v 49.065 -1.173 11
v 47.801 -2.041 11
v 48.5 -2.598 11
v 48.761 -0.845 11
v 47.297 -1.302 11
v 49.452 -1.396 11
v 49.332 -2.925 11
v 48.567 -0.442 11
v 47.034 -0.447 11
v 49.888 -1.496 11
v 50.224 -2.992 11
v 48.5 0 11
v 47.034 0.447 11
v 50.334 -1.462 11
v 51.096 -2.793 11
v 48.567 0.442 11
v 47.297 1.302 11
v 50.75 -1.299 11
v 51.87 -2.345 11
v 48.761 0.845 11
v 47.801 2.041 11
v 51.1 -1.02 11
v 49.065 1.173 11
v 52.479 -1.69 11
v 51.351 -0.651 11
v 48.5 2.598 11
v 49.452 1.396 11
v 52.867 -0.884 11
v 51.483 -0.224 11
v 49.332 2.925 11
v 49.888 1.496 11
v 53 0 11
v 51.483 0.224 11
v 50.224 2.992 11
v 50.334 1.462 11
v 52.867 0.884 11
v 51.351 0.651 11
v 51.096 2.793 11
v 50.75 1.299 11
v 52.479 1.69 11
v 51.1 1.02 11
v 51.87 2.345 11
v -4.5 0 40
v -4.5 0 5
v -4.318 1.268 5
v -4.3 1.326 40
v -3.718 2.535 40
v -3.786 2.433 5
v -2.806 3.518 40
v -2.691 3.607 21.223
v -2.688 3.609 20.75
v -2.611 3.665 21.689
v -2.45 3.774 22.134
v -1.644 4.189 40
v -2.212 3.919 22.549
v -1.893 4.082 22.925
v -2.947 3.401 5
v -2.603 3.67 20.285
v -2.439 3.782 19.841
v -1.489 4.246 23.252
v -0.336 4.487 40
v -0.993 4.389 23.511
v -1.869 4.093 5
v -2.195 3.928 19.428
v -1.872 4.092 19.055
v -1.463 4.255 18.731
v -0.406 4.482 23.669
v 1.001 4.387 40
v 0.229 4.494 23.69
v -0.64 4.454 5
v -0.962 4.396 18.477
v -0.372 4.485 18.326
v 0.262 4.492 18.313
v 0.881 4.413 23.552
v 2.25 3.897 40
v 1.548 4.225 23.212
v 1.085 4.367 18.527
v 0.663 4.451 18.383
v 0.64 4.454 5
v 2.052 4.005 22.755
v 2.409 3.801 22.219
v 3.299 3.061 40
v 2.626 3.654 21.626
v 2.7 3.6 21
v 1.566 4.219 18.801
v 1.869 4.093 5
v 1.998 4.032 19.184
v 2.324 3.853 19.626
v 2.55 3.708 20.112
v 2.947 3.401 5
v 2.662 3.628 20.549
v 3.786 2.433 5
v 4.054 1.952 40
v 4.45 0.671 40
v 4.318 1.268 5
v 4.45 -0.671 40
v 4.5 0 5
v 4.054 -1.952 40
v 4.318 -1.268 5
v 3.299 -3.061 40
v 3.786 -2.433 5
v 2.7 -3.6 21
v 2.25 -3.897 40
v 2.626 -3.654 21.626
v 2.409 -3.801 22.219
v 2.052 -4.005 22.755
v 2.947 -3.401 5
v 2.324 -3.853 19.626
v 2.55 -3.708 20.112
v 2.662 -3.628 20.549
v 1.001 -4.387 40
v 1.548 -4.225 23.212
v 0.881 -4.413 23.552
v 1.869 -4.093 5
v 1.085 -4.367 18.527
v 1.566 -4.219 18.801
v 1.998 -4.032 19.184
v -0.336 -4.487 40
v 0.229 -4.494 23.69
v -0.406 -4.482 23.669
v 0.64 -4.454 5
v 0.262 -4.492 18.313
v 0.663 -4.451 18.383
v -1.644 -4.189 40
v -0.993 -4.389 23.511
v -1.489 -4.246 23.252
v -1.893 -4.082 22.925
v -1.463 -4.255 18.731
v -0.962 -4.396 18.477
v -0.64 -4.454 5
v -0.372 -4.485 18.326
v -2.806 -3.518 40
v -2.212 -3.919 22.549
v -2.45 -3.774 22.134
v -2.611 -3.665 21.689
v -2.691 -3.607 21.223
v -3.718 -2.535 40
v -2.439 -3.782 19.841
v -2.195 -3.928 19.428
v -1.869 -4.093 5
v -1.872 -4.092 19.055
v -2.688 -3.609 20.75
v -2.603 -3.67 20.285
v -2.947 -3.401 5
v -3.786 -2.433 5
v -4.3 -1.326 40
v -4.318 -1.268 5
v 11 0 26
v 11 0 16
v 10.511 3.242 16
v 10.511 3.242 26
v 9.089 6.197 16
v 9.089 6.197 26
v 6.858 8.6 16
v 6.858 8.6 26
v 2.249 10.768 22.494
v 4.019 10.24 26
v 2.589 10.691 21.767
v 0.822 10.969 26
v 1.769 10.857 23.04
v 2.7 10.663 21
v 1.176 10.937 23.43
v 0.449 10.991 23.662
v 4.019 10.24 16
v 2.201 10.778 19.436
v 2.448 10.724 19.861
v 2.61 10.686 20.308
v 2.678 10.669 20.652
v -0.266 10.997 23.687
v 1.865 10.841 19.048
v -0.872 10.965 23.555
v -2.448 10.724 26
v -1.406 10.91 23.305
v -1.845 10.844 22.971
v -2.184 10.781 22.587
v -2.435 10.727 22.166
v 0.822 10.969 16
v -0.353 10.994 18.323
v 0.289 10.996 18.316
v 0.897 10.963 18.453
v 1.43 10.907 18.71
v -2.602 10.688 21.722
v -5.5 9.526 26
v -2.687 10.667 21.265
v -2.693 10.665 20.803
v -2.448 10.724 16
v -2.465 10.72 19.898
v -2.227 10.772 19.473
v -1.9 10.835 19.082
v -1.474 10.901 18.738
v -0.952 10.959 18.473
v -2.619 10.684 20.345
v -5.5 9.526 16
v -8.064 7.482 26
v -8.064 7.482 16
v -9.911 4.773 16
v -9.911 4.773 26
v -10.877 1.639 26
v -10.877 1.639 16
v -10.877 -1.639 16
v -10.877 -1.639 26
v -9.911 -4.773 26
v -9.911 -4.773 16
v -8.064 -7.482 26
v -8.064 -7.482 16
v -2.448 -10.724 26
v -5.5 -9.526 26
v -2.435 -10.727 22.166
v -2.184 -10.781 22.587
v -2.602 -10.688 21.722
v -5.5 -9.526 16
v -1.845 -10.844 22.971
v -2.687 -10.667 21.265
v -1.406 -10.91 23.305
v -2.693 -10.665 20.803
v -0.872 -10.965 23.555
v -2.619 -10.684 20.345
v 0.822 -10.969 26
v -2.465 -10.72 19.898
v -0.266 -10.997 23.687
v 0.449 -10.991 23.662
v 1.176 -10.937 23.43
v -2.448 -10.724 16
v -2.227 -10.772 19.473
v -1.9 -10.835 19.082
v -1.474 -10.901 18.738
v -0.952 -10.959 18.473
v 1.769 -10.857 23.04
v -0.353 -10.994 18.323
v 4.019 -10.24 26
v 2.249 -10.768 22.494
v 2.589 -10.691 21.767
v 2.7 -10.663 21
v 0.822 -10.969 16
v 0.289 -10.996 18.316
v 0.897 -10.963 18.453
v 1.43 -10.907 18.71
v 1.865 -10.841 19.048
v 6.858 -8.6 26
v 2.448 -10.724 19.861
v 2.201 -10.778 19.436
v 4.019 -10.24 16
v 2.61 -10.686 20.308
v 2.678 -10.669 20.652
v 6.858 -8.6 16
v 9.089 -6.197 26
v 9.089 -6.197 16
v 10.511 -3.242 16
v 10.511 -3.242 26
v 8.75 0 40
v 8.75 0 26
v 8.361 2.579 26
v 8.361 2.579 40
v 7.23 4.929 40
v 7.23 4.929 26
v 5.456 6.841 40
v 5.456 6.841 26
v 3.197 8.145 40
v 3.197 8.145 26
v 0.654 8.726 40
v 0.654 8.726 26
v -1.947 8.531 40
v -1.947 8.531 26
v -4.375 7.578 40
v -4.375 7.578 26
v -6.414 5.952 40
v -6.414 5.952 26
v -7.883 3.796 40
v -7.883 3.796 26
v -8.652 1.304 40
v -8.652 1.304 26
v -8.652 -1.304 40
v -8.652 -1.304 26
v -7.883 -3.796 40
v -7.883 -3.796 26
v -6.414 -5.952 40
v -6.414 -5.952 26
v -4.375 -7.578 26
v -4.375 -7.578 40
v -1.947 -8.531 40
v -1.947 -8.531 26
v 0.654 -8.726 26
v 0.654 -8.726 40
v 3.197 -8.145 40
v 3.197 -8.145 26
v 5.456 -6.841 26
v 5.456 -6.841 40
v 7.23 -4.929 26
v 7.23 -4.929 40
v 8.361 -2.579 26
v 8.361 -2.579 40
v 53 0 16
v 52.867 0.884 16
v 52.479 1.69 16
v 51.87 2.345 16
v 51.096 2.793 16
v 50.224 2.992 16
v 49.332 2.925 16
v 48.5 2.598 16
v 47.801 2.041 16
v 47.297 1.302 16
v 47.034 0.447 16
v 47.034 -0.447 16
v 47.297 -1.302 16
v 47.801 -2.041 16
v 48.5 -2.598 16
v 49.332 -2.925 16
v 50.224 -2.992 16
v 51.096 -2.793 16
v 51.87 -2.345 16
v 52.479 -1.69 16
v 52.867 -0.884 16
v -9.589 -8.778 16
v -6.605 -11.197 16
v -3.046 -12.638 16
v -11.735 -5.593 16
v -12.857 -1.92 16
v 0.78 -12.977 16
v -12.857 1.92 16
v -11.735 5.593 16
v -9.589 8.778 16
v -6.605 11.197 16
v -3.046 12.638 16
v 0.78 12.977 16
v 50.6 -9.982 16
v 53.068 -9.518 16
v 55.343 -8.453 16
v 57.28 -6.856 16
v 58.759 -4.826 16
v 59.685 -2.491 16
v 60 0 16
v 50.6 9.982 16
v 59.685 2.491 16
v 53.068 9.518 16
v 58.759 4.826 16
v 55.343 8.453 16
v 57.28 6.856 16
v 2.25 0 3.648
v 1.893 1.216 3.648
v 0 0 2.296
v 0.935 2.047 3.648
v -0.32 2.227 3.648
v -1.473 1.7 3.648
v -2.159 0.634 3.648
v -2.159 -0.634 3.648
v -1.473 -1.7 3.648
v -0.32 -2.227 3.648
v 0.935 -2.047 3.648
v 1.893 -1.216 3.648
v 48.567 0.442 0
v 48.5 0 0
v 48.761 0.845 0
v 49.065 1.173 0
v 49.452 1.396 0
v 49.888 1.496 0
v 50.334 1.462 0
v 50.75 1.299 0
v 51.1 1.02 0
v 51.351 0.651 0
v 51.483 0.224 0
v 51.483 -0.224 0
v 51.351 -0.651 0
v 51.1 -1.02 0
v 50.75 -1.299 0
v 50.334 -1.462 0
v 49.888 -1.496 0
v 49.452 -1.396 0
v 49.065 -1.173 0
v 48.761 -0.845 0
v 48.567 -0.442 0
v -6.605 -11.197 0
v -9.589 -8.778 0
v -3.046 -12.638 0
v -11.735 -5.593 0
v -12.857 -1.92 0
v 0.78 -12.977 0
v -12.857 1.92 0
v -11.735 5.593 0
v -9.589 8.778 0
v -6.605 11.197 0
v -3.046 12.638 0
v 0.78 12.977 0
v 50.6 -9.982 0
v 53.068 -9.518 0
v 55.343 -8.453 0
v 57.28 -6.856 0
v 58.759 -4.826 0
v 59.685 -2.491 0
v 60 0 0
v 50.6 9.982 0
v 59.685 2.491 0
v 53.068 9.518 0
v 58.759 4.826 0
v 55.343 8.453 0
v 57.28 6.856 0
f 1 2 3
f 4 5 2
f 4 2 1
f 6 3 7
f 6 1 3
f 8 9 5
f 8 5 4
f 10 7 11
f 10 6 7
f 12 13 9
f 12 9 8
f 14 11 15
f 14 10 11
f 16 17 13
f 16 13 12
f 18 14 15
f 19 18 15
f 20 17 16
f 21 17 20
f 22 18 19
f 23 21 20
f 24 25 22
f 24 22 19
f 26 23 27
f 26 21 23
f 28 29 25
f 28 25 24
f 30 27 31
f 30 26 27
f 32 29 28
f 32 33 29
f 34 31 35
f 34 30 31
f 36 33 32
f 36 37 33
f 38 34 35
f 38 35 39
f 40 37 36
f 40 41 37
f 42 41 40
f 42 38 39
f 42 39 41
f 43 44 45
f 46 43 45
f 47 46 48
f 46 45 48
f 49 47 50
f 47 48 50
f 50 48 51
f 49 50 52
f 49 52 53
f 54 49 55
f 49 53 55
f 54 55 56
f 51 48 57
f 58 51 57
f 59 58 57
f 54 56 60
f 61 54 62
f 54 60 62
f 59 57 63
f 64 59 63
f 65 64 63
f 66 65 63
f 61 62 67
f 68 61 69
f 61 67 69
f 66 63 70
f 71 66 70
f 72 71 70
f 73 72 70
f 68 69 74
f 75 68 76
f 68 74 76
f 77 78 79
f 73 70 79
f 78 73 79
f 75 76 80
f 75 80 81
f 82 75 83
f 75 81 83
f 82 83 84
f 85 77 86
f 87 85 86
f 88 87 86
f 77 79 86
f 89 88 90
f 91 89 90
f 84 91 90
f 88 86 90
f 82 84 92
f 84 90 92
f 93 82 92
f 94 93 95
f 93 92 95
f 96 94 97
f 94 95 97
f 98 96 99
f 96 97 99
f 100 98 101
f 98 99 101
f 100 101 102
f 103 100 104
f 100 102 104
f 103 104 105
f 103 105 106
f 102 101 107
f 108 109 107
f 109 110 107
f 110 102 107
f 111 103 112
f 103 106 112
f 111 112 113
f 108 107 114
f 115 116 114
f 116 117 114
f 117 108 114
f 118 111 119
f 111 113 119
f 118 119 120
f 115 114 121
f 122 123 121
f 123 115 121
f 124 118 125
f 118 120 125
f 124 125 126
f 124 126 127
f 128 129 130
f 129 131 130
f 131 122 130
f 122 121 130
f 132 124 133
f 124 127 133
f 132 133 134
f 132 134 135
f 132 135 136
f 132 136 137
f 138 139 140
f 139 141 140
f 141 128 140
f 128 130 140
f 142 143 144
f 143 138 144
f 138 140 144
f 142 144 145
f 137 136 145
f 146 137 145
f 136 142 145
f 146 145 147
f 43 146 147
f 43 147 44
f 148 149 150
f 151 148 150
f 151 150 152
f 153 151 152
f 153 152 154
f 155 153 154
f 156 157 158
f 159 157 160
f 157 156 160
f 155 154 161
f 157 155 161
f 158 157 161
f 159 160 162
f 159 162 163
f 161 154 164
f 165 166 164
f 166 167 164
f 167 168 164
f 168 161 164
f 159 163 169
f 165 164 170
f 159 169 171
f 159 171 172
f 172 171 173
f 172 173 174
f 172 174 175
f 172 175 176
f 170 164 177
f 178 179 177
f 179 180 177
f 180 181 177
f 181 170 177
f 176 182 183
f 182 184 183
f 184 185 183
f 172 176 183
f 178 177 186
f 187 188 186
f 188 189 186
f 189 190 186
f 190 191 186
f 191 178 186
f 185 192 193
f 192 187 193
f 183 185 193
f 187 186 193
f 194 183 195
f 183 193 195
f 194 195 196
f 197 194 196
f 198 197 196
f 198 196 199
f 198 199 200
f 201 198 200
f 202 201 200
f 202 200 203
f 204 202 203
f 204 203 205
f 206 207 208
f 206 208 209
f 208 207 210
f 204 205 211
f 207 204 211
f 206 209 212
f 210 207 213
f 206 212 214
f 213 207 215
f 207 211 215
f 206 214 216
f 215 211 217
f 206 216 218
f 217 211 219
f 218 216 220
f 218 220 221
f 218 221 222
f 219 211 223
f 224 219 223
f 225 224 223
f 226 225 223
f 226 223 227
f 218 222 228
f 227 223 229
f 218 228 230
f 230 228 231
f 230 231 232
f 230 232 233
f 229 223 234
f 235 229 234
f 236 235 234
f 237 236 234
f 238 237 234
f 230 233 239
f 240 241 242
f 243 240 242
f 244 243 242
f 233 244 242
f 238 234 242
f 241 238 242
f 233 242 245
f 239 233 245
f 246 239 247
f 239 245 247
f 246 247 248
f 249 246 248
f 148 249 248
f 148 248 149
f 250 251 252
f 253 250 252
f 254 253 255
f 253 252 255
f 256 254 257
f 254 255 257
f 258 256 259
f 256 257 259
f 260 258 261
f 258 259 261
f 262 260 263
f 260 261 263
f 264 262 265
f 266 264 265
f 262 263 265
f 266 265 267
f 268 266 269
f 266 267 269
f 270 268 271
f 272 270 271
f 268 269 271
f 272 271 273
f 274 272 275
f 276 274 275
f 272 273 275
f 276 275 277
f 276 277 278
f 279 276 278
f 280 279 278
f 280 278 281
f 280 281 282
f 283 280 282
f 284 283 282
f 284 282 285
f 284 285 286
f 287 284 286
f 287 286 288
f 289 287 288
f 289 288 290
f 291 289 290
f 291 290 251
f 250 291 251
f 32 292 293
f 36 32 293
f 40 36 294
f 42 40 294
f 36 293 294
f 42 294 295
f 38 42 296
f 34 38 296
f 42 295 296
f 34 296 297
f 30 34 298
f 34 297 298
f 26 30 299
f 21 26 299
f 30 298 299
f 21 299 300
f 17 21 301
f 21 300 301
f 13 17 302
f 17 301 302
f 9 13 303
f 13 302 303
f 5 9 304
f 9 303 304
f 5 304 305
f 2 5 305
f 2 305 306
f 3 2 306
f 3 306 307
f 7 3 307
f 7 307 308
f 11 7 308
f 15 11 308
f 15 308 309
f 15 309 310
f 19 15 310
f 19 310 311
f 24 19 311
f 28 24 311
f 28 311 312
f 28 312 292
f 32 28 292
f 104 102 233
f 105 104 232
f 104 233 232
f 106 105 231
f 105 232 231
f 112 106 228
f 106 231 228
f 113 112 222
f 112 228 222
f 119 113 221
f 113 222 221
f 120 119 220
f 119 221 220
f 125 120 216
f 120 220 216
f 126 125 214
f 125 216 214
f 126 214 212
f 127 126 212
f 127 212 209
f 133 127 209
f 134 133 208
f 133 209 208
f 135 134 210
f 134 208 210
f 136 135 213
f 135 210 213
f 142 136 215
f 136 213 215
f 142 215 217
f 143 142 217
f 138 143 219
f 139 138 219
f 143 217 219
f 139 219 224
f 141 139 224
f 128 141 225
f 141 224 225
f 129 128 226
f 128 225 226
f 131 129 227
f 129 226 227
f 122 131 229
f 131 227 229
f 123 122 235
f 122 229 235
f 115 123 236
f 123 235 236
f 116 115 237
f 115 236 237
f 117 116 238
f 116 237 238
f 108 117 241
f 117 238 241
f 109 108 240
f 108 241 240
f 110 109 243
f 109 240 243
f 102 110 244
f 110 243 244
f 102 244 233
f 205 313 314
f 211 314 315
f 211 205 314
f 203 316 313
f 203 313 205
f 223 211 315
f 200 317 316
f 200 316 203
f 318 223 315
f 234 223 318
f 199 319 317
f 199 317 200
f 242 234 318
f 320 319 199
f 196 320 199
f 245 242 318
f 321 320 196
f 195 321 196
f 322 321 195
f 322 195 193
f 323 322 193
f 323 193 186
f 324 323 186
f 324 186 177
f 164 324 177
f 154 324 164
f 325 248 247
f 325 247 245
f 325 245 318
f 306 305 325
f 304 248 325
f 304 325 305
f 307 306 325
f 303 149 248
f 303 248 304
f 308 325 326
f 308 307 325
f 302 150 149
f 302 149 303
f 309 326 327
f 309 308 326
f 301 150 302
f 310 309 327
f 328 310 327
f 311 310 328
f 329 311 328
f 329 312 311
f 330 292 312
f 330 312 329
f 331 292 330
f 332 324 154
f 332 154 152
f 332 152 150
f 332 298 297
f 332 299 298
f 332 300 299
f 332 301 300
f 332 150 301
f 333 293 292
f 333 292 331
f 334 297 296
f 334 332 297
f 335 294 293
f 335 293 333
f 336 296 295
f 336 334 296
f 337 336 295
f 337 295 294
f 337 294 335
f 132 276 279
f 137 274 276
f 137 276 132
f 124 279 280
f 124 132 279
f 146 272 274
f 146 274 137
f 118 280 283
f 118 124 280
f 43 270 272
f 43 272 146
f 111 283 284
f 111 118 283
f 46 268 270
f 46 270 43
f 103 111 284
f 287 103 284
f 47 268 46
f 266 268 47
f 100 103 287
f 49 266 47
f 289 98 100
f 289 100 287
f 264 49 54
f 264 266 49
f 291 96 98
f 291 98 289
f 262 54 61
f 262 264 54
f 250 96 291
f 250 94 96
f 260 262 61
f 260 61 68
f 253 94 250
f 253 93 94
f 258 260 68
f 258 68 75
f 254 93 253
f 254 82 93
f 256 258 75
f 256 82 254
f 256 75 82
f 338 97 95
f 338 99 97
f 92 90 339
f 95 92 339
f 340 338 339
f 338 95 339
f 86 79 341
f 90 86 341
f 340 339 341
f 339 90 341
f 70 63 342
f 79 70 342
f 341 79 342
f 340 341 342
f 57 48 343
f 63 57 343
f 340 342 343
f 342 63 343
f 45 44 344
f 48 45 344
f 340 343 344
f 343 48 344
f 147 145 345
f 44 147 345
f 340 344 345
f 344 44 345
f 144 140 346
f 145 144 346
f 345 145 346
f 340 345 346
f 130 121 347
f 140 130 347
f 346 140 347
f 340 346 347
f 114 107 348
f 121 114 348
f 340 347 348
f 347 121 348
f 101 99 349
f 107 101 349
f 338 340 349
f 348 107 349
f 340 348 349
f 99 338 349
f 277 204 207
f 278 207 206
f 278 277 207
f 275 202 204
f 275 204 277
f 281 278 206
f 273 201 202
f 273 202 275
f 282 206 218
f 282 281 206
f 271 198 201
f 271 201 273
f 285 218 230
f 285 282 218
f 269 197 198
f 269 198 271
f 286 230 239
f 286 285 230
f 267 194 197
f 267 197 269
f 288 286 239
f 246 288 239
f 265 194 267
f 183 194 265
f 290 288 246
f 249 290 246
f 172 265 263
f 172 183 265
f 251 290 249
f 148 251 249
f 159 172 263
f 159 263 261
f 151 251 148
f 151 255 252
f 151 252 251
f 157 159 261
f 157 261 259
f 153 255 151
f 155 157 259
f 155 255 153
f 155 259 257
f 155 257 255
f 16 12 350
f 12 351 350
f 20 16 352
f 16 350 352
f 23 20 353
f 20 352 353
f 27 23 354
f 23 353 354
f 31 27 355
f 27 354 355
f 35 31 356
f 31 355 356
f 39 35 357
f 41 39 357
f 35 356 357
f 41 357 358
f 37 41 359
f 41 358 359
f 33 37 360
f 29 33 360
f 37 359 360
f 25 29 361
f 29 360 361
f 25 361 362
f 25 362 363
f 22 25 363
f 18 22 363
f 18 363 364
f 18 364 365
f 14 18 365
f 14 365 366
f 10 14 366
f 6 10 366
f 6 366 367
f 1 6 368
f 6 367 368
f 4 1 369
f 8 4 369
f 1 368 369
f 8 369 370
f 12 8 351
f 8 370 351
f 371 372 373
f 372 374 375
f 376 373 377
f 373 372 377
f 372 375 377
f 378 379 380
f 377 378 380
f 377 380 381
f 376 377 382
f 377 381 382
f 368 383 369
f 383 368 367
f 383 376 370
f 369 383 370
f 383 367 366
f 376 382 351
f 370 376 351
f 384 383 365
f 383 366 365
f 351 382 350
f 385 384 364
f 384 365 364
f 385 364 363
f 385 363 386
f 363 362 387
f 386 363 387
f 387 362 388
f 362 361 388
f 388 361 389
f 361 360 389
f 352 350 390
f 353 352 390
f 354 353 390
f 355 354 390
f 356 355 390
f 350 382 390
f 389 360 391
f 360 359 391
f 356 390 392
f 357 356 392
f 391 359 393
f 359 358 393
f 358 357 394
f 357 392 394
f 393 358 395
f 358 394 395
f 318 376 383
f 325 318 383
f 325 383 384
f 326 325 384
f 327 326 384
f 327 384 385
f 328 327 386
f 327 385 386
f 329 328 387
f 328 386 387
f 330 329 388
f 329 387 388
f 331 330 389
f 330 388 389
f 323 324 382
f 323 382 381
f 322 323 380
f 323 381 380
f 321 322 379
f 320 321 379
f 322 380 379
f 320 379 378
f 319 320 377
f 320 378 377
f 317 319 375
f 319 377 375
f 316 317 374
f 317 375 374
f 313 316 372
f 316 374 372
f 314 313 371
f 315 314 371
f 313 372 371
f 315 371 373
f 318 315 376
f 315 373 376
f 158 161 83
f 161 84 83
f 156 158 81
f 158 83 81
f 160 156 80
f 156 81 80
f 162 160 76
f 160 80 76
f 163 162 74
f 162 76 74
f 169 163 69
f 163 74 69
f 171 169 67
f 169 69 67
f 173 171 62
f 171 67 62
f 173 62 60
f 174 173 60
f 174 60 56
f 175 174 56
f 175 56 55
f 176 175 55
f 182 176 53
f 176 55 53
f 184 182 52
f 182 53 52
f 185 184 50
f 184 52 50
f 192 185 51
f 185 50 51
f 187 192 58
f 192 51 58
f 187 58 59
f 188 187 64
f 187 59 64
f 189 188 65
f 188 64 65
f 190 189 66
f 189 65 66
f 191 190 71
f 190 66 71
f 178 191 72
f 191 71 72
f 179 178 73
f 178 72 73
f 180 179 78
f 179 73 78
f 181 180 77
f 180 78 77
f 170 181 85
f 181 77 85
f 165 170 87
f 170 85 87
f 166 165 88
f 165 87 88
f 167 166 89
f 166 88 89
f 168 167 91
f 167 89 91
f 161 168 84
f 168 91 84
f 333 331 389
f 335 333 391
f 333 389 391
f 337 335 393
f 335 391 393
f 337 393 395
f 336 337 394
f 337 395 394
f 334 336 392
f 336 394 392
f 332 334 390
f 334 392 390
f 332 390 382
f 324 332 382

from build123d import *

# Parameters (mm, degrees)
F1_DEPTH        = 16
F2_R            = 11
F3_DEPTH        = 26
F4_R            = 8.75
F5_DEPTH        = 40
F7_D            = 9
F7_DEPTH        = 35
F7_TIP          = 2.7038727856
F8_R            = 2.7
F9_DEPTH        = 12.5
F11_D           = 3
F11_CBORE_D     = 6
F11_CBORE_DEPTH = 5


with BuildPart() as f1:
    # F0 (on Top) → F1 (new body)
    with BuildSketch(Plane.XY):
        with BuildLine():
            ThreePointArc((0.78, -12.976578902), (9.4641428561, -8.9123509805), (13, 0))
            ThreePointArc((13, 0), (9.4641428561, 8.9123509805), (0.78, 12.976578902))
            ThreePointArc((0.78, 12.976578902), (-13, 0), (0.78, -12.976578902))
        make_face()
        with BuildLine():
            ThreePointArc((0.78, 12.976578902), (9.4641428561, 8.9123509805), (13, 0))
            ThreePointArc((13, 0), (9.4641428561, -8.9123509805), (0.78, -12.976578902))
            Line((0.78, -12.976578902), (50.6, -9.9819837708))
            ThreePointArc((50.6, -9.9819837708), (40, 0), (50.6, 9.9819837708))
            Line((50.6, 9.9819837708), (0.78, 12.976578902))
        make_face()
        with BuildLine():
            ThreePointArc((60, 0), (57.2801098893, 6.8556546004), (50.6, 9.9819837708))
            ThreePointArc((50.6, 9.9819837708), (40, 0), (50.6, -9.9819837708))
            ThreePointArc((50.6, -9.9819837708), (57.2801098893, -6.8556546004), (60, 0))
        make_face()
    extrude(amount=F1_DEPTH)

    # F2 (on Top) → F3 (join)
    with BuildSketch(Plane.XY):
        Circle(F2_R)
    extrude(amount=F3_DEPTH)

    # F4 (on Top) → F5 (join)
    with BuildSketch(Plane.XY):
        Circle(F4_R)
    extrude(amount=F5_DEPTH)

    # F7
    with Locations(Plane.XY.offset(40)):
        with Locations((0, 0)):
            Hole(F7_D / 2, depth=F7_DEPTH)
            with Locations((0, 0, -(F7_DEPTH + F7_TIP / 2))):  # 118° drill point
                Cone(0, F7_D / 2, F7_TIP, mode=Mode.SUBTRACT)

    # F8 (on Front) → F9 (cut, symmetric)
    with BuildSketch(Plane.XZ):
        with Locations((0, 21)):
            Circle(F8_R)
    extrude(amount=F9_DEPTH, both=True, mode=Mode.SUBTRACT)

    # F11 (through all)
    with Locations(Plane.XY.offset(16)):
        with Locations((50, 0)):
            CounterBoreHole(F11_D / 2, F11_CBORE_D / 2, F11_CBORE_DEPTH)


solid = f1.part
